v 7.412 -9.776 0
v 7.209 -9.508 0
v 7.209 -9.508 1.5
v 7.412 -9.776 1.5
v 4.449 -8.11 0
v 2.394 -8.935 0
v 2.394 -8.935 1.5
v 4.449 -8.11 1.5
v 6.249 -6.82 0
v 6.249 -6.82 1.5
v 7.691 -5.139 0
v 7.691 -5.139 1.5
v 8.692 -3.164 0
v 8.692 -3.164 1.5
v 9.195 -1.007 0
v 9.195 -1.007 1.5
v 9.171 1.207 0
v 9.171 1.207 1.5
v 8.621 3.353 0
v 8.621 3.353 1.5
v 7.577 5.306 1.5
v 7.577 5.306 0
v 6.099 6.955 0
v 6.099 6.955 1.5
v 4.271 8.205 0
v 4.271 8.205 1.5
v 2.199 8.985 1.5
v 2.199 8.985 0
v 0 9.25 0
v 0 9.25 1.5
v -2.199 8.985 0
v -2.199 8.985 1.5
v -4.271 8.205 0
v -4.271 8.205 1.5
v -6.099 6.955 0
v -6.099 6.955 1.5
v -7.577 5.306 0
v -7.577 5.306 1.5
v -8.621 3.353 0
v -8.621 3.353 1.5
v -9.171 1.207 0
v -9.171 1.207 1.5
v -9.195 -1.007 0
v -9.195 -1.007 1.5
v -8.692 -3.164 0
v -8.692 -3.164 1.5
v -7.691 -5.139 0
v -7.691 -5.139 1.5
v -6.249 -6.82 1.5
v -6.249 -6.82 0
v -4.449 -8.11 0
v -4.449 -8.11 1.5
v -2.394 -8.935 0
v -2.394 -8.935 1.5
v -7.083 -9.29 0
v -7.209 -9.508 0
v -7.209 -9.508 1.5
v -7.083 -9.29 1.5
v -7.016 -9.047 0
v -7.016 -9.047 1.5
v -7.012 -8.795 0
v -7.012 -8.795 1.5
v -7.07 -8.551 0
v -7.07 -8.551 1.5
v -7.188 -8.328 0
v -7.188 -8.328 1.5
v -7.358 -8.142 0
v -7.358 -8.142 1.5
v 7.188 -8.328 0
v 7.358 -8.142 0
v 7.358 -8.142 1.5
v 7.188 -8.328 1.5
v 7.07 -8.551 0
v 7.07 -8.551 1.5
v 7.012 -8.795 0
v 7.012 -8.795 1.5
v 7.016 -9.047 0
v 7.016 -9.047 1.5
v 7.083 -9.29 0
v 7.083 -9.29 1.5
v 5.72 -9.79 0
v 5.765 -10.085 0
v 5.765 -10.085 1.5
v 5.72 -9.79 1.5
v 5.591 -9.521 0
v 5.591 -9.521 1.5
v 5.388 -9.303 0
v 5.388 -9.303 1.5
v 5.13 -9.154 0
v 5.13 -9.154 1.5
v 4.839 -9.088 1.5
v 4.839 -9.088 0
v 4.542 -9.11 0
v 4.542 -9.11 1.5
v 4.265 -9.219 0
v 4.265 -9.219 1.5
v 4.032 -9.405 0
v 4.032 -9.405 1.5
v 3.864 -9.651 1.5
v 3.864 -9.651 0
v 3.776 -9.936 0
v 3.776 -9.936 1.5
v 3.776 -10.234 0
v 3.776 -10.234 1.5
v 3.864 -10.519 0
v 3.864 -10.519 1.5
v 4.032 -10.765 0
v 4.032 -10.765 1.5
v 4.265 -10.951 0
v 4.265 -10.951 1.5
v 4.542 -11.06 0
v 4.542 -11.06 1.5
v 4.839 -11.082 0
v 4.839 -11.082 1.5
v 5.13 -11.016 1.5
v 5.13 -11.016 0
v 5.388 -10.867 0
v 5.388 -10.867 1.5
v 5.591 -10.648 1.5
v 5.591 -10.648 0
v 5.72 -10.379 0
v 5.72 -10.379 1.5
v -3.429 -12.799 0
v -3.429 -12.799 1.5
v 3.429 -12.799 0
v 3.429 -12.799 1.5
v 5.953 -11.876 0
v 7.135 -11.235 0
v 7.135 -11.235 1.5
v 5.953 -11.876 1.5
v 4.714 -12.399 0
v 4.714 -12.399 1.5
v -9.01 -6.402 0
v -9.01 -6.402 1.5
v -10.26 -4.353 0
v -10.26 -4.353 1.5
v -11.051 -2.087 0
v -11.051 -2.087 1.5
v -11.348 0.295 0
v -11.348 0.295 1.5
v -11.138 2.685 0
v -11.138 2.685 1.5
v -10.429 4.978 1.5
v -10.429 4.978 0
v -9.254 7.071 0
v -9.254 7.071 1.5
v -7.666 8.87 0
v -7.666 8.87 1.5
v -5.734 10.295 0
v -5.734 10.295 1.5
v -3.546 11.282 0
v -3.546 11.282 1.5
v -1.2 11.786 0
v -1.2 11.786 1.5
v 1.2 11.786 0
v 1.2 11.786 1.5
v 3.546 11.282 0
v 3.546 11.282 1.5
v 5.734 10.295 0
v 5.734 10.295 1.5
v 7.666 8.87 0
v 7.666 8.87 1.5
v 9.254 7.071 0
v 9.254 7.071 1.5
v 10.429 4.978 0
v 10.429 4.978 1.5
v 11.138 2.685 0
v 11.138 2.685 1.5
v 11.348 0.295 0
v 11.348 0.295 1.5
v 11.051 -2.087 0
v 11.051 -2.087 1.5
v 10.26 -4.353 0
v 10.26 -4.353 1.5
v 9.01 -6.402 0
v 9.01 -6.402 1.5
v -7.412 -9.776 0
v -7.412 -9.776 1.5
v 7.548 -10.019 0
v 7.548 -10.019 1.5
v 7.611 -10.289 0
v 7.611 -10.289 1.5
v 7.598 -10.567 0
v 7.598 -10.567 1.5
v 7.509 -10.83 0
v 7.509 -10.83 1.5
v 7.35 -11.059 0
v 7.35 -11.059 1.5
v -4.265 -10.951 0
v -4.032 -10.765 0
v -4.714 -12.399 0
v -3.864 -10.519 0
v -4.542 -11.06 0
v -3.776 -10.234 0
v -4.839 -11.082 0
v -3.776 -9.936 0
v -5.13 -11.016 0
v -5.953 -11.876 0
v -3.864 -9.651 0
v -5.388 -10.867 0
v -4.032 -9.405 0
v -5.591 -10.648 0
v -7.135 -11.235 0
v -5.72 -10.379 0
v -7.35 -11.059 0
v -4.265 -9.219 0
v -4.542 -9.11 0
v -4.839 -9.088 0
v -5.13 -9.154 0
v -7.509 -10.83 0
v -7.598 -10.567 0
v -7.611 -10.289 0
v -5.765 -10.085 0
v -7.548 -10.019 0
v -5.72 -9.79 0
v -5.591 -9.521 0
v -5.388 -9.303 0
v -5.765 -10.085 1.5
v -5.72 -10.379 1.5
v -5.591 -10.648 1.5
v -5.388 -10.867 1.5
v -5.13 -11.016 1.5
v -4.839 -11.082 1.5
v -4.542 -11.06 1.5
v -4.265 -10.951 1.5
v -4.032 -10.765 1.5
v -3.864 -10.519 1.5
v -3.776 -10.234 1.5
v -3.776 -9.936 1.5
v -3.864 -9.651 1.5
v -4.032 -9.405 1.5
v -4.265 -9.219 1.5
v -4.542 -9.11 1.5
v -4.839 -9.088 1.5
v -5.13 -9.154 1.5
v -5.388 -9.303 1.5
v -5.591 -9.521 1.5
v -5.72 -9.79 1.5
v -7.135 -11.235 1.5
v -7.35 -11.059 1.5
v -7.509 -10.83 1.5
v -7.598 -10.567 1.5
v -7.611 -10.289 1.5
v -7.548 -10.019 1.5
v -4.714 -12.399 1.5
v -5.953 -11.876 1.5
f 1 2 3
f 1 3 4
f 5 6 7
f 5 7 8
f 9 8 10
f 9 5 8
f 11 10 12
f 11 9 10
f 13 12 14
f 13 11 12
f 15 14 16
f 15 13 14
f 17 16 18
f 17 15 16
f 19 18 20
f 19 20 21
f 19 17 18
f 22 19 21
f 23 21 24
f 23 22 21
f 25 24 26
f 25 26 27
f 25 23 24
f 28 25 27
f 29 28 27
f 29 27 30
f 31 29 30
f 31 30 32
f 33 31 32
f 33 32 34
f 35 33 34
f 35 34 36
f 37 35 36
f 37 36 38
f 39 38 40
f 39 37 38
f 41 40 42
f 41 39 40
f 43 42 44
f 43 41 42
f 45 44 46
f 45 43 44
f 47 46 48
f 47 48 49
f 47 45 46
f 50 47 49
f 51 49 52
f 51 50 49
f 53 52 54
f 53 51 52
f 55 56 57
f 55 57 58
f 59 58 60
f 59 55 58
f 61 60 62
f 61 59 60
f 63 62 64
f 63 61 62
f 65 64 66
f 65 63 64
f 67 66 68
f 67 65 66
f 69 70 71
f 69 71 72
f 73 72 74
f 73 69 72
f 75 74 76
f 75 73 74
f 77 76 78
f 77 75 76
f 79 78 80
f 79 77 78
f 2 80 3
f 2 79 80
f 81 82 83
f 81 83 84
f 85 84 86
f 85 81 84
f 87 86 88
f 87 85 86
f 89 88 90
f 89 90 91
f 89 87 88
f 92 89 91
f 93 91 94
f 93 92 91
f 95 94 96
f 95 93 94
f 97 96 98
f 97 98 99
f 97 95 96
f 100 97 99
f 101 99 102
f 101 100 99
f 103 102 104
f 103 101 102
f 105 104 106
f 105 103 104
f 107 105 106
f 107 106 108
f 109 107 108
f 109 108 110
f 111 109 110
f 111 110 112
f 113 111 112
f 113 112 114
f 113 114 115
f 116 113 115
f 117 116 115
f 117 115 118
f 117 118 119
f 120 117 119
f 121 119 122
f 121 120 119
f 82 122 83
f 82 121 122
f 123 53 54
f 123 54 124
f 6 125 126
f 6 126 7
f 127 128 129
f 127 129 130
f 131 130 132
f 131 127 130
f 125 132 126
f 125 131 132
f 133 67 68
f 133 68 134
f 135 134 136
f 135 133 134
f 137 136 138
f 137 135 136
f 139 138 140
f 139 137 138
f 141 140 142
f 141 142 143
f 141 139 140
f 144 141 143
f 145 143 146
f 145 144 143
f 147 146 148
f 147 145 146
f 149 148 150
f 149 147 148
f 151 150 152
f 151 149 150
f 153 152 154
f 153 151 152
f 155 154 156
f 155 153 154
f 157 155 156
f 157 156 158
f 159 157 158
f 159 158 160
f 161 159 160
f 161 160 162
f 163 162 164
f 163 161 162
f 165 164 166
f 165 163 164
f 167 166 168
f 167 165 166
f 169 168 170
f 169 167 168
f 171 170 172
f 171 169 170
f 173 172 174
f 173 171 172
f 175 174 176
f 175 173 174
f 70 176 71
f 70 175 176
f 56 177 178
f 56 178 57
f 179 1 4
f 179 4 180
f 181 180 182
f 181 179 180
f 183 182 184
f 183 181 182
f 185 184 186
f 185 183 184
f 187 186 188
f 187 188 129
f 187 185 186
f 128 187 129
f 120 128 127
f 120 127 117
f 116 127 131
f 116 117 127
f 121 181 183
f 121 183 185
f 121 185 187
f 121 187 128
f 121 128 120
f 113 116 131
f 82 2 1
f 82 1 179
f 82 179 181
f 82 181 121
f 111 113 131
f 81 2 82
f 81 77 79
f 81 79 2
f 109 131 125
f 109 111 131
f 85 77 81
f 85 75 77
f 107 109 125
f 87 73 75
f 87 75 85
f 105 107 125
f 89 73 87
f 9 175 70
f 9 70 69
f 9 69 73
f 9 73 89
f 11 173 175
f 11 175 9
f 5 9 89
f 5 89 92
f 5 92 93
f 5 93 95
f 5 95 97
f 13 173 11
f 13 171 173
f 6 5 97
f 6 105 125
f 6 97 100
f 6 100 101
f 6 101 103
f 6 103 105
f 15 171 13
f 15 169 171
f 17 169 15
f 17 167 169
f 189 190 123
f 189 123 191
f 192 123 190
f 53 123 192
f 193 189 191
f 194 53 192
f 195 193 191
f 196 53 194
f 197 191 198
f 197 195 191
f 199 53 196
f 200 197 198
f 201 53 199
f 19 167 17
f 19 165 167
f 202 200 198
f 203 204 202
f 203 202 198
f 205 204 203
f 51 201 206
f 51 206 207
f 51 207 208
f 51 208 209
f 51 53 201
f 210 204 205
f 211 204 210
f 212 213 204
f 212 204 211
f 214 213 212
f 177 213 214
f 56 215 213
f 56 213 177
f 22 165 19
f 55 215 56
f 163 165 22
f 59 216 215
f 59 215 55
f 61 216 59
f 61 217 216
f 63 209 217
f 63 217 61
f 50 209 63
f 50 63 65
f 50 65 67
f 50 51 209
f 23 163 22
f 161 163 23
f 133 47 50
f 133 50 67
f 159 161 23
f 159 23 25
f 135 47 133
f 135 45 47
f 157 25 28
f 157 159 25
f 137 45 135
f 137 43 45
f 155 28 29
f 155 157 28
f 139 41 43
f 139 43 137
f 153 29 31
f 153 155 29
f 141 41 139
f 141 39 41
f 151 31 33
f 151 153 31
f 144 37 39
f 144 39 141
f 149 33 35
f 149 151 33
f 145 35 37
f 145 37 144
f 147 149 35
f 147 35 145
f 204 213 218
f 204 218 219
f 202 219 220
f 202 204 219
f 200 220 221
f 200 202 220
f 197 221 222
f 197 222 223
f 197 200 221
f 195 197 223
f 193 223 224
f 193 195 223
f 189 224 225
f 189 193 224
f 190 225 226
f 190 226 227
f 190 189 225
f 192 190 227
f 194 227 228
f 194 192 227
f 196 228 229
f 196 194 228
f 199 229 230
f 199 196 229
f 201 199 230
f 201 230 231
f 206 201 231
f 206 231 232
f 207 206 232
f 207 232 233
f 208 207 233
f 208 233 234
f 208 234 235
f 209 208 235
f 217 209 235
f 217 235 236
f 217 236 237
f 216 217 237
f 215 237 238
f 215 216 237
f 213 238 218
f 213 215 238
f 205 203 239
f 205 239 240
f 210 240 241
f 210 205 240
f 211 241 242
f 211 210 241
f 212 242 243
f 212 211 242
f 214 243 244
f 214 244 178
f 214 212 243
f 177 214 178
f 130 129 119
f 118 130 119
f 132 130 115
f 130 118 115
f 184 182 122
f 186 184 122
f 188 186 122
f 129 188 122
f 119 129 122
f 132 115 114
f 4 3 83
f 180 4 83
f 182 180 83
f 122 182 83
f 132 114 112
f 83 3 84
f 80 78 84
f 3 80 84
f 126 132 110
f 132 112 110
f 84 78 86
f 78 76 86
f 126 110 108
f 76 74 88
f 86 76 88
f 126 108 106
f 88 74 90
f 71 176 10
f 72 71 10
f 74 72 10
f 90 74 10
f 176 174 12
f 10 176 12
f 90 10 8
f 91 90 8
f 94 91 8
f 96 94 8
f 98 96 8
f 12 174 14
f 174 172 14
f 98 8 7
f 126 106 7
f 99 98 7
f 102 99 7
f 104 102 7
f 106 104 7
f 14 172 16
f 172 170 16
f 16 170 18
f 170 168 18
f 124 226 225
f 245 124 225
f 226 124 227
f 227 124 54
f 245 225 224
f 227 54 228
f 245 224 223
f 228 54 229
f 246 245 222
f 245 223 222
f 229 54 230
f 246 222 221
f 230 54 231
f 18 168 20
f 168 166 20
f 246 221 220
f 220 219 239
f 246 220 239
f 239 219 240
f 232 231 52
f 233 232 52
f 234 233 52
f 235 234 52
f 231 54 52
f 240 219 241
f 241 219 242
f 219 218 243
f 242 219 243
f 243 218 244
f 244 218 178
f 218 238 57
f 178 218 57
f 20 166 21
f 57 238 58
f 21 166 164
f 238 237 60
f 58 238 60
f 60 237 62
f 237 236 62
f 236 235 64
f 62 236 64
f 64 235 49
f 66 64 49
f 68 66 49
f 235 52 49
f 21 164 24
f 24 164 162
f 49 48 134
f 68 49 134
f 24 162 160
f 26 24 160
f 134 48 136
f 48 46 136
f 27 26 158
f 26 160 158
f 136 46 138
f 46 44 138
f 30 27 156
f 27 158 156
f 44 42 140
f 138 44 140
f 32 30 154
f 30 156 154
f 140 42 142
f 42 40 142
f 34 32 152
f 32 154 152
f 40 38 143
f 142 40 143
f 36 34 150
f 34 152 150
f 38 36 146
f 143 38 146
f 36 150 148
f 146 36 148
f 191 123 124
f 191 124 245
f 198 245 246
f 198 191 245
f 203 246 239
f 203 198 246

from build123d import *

# Parameters (mm, degrees)
ESQUISSE1_R          = 1
BASE_EXTRUSION_DEPTH = 1.5


with BuildPart() as part:
    # Esquisse1 → Base-Extrusion (new body)
    with BuildSketch(Plane.XY):
        with BuildLine():
            Line((7.209029703, -9.507825682), (7.412373516, -9.776011223))
            ThreePointArc((7.412373516, -9.776011223), (7.597932232, -10.566966478), (7.135063159, -11.234644899))
            ThreePointArc((7.135063159, -11.234644899), (5.339769929, -12.152978871), (3.429352348, -12.798517198))
            Line((3.429352348, -12.798517198), (2.394076167, -8.934813893))
            ThreePointArc((2.394076167, -8.934813893), (0, 9.25), (-2.394076167, -8.934813893))
            Line((-2.394076167, -8.934813893), (-3.429352348, -12.798517198))
            ThreePointArc((-3.429352348, -12.798517198), (-5.339769929, -12.152978871), (-7.135063159, -11.234644899))
            ThreePointArc((-7.135063159, -11.234644899), (-7.597932232, -10.566966478), (-7.412373516, -9.776011223))
            Line((-7.412373516, -9.776011223), (-7.209029703, -9.507825682))
            ThreePointArc((-7.209029703, -9.507825682), (-7.011742469, -8.795467512), (-7.357625498, -8.142213086))
            ThreePointArc((-7.357625498, -8.142213086), (0, 11.85), (7.357625498, -8.142213086))
            ThreePointArc((7.357625498, -8.142213086), (7.011742469, -8.795467512), (7.209029703, -9.507825682))
        make_face()
        with Locations((4.764569663, -10.084729396)):
            Circle(ESQUISSE1_R, mode=Mode.SUBTRACT)
        with Locations(Location((-4.764569663, -10.084729396, 0), (0, 0, 180))):
            Circle(ESQUISSE1_R, mode=Mode.SUBTRACT)
    extrude(amount=BASE_EXTRUSION_DEPTH)


solid = part.part
